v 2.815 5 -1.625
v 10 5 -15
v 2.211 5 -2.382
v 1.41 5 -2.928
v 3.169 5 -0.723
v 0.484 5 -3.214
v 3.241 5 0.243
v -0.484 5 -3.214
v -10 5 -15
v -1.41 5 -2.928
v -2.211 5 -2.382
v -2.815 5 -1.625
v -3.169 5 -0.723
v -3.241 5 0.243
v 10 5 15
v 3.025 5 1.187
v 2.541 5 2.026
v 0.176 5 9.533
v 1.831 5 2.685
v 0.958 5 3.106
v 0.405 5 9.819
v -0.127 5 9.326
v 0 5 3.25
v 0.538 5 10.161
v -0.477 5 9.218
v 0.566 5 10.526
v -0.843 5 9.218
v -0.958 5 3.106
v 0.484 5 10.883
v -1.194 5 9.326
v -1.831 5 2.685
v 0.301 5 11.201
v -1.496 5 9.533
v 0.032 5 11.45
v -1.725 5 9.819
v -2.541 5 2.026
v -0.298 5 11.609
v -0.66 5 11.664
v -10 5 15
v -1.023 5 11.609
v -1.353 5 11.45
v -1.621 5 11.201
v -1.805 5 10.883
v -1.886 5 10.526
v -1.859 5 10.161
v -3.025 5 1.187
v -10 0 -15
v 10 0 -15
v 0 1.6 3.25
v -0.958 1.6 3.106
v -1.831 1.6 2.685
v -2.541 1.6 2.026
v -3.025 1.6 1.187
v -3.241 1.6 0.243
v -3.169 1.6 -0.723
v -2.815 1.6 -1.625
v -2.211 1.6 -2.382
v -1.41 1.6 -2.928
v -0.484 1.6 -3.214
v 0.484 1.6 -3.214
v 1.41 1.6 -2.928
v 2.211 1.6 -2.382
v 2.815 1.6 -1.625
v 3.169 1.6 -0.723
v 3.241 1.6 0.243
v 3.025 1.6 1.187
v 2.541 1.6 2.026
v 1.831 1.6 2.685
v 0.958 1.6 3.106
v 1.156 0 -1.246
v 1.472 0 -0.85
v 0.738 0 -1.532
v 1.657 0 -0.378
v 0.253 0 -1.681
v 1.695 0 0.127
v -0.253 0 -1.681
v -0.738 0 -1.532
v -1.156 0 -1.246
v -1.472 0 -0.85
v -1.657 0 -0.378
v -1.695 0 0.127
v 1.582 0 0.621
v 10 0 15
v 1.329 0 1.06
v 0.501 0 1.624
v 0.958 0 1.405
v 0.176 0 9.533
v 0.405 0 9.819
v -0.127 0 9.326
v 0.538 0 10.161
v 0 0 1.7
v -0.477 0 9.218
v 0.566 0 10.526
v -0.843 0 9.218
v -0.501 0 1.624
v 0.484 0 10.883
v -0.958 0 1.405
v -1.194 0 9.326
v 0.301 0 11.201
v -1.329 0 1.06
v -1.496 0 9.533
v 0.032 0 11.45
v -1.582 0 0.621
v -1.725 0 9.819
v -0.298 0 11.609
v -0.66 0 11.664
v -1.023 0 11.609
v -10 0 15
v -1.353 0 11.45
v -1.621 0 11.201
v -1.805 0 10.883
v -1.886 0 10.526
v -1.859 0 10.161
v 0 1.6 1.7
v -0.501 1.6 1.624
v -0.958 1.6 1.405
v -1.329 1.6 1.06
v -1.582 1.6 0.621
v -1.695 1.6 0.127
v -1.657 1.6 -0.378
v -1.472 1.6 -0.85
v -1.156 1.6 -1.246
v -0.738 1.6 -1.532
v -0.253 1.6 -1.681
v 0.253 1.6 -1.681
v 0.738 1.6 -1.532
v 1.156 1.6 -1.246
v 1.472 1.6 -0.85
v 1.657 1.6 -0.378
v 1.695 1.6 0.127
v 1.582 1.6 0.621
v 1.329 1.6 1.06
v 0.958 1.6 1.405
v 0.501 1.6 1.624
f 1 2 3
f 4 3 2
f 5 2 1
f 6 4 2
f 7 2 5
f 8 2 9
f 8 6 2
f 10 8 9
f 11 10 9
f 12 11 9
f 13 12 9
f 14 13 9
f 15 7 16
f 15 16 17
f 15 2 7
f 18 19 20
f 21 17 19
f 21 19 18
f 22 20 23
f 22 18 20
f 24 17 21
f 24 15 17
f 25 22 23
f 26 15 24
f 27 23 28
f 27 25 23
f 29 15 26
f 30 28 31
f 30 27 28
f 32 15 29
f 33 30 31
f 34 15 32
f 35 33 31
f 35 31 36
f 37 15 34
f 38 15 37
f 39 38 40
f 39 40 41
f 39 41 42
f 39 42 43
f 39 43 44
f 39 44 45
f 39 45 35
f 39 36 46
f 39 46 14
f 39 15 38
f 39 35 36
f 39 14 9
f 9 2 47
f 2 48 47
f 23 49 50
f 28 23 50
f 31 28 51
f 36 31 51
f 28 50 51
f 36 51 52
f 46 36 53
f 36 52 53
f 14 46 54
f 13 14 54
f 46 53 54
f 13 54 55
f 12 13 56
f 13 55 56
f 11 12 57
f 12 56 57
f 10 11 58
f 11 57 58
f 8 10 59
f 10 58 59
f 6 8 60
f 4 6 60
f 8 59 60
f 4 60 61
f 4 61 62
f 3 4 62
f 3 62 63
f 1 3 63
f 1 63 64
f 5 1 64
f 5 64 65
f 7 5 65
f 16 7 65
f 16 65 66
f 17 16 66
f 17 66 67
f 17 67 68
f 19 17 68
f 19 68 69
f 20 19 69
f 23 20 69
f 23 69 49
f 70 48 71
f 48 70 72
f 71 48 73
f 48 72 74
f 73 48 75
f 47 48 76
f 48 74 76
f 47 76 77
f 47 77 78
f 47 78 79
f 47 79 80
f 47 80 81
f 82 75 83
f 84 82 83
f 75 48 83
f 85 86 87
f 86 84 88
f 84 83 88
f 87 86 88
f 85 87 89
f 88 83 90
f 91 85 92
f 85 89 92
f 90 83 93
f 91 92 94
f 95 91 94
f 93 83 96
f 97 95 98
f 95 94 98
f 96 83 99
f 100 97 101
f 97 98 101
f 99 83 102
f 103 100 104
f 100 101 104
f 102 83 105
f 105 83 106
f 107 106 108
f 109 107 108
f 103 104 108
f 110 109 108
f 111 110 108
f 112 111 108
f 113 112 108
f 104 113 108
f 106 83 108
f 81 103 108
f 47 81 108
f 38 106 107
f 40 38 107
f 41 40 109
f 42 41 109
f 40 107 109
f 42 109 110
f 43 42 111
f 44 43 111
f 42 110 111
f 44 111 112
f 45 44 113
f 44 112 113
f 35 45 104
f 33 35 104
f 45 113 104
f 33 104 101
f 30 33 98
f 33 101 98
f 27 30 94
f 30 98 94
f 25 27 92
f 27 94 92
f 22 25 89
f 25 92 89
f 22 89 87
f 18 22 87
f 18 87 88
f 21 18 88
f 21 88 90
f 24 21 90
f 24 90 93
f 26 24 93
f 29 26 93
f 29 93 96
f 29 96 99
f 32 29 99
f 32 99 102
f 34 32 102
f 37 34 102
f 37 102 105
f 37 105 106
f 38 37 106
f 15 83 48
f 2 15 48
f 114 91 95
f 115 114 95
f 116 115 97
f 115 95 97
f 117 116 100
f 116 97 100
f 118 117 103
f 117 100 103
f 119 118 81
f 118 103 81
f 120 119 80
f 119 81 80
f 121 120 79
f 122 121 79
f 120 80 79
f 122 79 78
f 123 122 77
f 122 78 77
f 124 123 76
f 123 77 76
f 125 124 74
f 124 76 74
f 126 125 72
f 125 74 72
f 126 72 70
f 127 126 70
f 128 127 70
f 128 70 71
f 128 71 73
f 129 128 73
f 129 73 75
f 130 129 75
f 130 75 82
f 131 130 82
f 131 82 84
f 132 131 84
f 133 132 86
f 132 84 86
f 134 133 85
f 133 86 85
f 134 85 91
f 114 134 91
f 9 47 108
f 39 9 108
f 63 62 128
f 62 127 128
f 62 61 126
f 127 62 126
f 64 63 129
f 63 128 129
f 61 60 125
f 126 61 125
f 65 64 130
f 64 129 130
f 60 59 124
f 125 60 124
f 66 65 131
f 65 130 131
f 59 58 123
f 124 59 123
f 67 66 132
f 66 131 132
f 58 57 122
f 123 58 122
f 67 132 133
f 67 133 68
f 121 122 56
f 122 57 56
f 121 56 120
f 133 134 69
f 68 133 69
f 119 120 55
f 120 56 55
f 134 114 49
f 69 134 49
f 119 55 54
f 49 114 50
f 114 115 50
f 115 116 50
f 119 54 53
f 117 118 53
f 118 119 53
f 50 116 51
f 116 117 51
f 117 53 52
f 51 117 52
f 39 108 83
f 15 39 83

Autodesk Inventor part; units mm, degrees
ref_plane "YZ Plane" through (0, 0, 0) normal (1, 0, 0) x (0, 1, 0)
ref_plane "XZ Plane" through (0, 0, 0) normal (0, 1, 0) x (-1, 0, 0)
ref_plane "XY Plane" through (0, 0, 0) normal (0, 0, 1) x (1, 0, 0)
sketch "Sketch1" plane through (0, 0, 0) normal (0, 1, 0) x (-1, 0, 0)
  line L0 (-10, -15) -> (10, -15)
  line L1 (10, -15) -> (10, 15)
  line L2 (10, 15) -> (-10, 15)
  line L3 (-10, 15) -> (-10, -15)
  line L4 (-10, -15) -> (10, 15) construction
  line L5 (10, -15) -> (-10, 15) construction
  point P0 (0, 0)
  dimension "d0" = 20
  dimension "d1" = 30
extrude "Extrusion1" add sketch "Sketch1" along normal blind 5
sketch "Sketch2" plane through (0, 5, 0) normal (0, 1, 0) x (1, 0, 0)
  line L0 (-10, -15) -> (10, -15) projected
  line L1 (0, -15) -> (0, 15)
  line L2 (10, 15) -> (-10, 15) projected
  point P0 (0, 0)
  point P1 (0, -19.7357)
  point P2 (0, -11.8278)
  point P3 (0, -3.988)
  point P4 (0, 4.0562)
  point P5 (0, 11.7596)
  point P6 (0, 20.6901)
hole "Hole1" at (0, 5, 19.7357) at (0, 5, 0) direction (0, -1, 0) diameter 3.4 end through all counterbore diameter 6.5 counterbore depth 3.4 clearance for "Socket Head Cap Screw DIN EN ISO 4762" size "M3" standard "DIN"
sketch "Sketch3" plane through (0, 5, 0) normal (0, 1, 0) x (1, 0, 0)
  point P0 (0, 0)
  point P1 (-0.6602, -10.4342)
hole "Hole2" at (-0.6602, 5, 10.4342) direction (0, -1, 0) diameter 2.459 end through all thread size "M3x0.5" class "6H" standard "ISO Metric profile"
properties part number "Tap_Test"
